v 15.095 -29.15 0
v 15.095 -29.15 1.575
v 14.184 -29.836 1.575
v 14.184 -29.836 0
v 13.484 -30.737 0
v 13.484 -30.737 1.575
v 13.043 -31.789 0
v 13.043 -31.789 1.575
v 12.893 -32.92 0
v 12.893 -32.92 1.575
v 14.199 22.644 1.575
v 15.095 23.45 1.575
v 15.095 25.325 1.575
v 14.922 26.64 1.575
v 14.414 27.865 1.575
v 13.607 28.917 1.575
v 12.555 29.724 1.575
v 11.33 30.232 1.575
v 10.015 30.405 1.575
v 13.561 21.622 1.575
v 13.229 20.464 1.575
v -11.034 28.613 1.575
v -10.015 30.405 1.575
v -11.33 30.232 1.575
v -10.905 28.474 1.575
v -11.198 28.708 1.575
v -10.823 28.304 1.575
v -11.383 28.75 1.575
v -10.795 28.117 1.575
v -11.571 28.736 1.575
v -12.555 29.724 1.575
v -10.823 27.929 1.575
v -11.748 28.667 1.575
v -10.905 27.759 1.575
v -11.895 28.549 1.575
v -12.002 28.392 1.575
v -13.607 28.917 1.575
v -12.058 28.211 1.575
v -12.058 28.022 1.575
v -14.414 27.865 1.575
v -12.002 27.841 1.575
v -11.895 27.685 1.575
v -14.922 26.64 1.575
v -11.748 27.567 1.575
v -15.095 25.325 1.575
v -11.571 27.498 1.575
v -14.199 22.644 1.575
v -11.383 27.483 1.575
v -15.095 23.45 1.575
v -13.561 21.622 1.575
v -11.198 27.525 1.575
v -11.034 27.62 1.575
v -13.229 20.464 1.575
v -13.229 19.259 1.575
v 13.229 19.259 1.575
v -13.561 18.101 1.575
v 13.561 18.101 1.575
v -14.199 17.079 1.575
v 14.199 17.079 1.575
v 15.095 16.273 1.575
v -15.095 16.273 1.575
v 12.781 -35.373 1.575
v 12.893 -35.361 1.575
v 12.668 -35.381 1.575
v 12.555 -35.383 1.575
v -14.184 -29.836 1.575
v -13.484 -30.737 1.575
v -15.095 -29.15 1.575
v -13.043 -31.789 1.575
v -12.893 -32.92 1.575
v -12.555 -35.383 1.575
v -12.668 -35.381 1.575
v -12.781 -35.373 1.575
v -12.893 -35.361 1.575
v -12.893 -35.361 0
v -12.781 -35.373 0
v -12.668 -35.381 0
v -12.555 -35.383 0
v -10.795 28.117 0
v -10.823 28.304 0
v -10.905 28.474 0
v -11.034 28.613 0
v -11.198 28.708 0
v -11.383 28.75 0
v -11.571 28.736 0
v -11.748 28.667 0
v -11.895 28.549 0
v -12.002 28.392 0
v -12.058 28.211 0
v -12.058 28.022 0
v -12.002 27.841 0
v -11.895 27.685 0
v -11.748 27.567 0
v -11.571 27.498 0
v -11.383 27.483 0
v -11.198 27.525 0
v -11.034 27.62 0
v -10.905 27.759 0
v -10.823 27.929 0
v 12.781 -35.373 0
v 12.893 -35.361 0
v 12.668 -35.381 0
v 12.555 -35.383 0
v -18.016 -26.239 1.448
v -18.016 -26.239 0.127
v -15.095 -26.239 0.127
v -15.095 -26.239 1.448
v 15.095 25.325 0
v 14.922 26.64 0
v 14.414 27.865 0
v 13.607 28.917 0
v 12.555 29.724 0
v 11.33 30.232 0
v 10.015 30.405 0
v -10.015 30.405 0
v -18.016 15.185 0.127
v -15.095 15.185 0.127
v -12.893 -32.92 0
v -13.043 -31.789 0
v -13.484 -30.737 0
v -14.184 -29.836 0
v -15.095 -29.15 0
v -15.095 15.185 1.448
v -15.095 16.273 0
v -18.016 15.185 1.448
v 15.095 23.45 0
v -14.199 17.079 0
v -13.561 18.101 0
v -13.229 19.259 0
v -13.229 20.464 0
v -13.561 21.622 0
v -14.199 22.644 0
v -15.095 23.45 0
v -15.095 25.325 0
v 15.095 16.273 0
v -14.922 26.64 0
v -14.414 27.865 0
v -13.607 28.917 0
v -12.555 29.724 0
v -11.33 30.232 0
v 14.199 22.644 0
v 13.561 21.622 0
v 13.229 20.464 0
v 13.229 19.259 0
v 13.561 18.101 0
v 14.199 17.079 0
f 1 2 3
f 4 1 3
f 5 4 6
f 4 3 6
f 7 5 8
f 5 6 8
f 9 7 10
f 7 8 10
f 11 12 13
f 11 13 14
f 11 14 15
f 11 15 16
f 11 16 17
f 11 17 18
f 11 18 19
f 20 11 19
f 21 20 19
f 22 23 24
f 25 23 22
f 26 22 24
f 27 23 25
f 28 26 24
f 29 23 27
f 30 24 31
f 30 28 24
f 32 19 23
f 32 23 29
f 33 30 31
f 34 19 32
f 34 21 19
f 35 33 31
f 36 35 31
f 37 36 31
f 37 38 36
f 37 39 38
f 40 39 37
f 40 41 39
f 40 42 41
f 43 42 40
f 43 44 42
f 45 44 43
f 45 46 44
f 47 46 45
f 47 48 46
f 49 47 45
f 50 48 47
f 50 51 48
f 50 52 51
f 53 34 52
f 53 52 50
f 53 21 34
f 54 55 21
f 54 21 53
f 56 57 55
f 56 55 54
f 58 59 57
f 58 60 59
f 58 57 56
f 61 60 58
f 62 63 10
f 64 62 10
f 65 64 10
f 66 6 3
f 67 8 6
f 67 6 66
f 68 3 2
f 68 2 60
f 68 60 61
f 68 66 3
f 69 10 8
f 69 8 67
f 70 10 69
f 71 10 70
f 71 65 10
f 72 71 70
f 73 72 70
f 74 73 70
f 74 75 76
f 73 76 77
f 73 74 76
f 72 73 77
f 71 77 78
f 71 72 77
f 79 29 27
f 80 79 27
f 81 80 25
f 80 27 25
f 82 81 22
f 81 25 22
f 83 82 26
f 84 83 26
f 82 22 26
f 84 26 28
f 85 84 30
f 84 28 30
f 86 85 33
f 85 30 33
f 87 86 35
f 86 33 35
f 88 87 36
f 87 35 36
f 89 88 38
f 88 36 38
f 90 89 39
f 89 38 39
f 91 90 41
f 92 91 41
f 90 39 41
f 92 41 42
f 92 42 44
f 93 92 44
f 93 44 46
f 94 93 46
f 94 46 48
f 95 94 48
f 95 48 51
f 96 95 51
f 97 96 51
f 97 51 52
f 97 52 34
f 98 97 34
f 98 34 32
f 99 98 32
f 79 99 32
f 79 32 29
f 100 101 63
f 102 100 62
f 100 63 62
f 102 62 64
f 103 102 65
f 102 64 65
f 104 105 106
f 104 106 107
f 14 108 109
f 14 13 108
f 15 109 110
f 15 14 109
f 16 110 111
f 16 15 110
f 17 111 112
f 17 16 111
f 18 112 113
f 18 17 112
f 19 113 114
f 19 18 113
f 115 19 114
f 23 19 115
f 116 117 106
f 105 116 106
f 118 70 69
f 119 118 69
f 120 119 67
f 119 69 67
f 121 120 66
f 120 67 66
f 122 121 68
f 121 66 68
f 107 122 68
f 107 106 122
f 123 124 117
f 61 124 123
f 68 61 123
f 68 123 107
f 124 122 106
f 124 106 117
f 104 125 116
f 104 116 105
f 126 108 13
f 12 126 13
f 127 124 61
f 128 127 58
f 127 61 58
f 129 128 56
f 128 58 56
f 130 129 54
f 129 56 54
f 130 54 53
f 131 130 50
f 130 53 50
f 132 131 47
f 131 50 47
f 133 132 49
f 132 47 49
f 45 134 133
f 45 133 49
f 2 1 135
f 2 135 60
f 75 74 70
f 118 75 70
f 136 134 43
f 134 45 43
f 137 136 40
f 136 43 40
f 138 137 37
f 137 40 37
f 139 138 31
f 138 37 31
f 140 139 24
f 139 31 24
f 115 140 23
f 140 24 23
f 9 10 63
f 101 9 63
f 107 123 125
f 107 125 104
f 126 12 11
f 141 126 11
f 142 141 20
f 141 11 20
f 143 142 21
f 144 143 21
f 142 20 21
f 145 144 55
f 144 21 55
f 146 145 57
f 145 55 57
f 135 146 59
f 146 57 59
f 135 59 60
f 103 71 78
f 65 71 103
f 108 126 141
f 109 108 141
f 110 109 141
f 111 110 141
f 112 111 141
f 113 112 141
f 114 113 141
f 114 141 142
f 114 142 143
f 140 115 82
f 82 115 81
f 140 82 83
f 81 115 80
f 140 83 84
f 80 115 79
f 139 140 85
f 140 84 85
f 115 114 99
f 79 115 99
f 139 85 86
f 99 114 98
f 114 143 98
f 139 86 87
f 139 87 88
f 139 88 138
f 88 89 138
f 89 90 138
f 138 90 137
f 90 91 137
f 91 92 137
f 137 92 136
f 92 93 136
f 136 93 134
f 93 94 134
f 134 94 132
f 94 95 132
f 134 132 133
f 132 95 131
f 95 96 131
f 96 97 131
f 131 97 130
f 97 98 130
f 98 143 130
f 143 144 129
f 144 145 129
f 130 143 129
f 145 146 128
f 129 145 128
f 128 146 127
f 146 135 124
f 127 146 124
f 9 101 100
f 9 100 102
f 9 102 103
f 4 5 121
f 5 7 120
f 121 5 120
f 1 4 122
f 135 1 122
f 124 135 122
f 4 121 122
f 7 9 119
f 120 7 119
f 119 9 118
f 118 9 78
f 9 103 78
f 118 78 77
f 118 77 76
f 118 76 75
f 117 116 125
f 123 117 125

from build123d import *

# Parameters (mm, degrees)
F0_W      = 30.19
F0_H      = 57
F1_DEPTH  = 1.5748
F2_W      = 30.19
F2_H      = 1.5748
F3_DEPTH  = 6.8834
F4_R      = 2.54
F5_R      = 4.32816
F6_DEPTH  = 1.5758
F7_W      = 30.19
F7_H      = 1.5748
F8_DEPTH  = 1.905
F9_R      = 5.08
F10_R     = 0.635
F11_DEPTH = 25.4
F12_W     = 41.4245947965
F12_H     = 1.3208
F13_DEPTH = 2.921


with BuildPart() as f1:
    # F0 (on Top) → F1 (new body)
    with BuildSketch(Plane.XY):
        Rectangle(F0_W, F0_H)
    extrude(amount=F1_DEPTH)

    # F2 (on face) → F3 (join)
    with BuildSketch(Plane.XZ.offset(28.5)):
        with Locations((0, 0.7874)):
            Rectangle(F2_W, F2_H)
    extrude(amount=F3_DEPTH)

    # F4
    f4_edges = [f1.edges().sort_by_distance(p)[0] for p in [
        (15.095, -35.3834, 0.7874),
        (-15.095, -35.3834, 0.7874),
    ]]
    fillet(f4_edges, radius=F4_R)

    # F5 (on face) → F6 (cut, through all)
    with BuildSketch(Plane.XY.offset(1.5748)):
        with Locations((-17.51457, 19.8616)):
            Circle(F5_R)
        with Locations((17.51457, 19.8616)):
            Circle(F5_R)
        with BuildLine():
            Line((-17.2212, -32.9196), (-12.89304, -32.9196))
            ThreePointArc((-12.89304, -32.9196), (-20.2816712861, -29.8591287139), (-17.2212, -37.24776))
            Line((-17.2212, -37.24776), (-17.2212, -32.9196))
        make_face()
        with BuildLine():
            Line((-12.89304, -37.24776), (-12.89304, -32.9196))
            ThreePointArc((-12.89304, -32.9196), (-14.1607287139, -35.9800712861), (-17.2212, -37.24776))
            Line((-17.2212, -37.24776), (-12.89304, -37.24776))
        make_face()
        with BuildLine():
            ThreePointArc((-17.2212, -37.24776), (-14.1607287139, -35.9800712861), (-12.89304, -32.9196))
            Line((-12.89304, -32.9196), (-17.2212, -32.9196))
            Line((-17.2212, -32.9196), (-17.2212, -37.24776))
        make_face()
        with BuildLine():
            ThreePointArc((17.2212, -37.24776), (20.2816712861, -35.9800712861), (21.54936, -32.9196))
            ThreePointArc((21.54936, -32.9196), (17.2212, -28.59144), (12.89304, -32.9196))
            Line((12.89304, -32.9196), (17.2212, -32.9196))
            Line((17.2212, -32.9196), (17.2212, -37.24776))
        make_face()
        with BuildLine():
            Line((17.2212, -32.9196), (12.89304, -32.9196))
            ThreePointArc((12.89304, -32.9196), (14.1607287139, -35.9800712861), (17.2212, -37.24776))
            Line((17.2212, -37.24776), (17.2212, -32.9196))
        make_face()
        with BuildLine():
            ThreePointArc((17.2212, -37.24776), (14.1607287139, -35.9800712861), (12.89304, -32.9196))
            Line((12.89304, -32.9196), (12.89304, -37.24776))
            Line((12.89304, -37.24776), (17.2212, -37.24776))
        make_face()
    extrude(amount=-F6_DEPTH, mode=Mode.SUBTRACT)

    # F7 (on face) → F8 (join)
    with BuildSketch(Plane(origin=(0, 28.5, 0), x_dir=(-1, 0, 0), z_dir=(0, 1, 0))):
        with Locations((0, 0.7874)):
            Rectangle(F7_W, F7_H)
    extrude(amount=F8_DEPTH)

    # F9
    f9_edges = [f1.edges().sort_by_distance(p)[0] for p in [
        (-15.095, 30.405, 0.7874),
        (15.095, 30.405, 0.7874),
    ]]
    fillet(f9_edges, radius=F9_R)

    # F10 (on face) → F11 (cut)
    with BuildSketch(Plane.XY.offset(1.5748)):
        with Locations((-11.43, 28.1166)):
            Circle(F10_R)
    extrude(amount=-F11_DEPTH, mode=Mode.SUBTRACT)

    # F12 (on face) → F13 (join)
    with BuildSketch(Plane(origin=(-15.095, 0, 0), x_dir=(0, -1, 0), z_dir=(-1, 0, 0))):
        with Locations((5.5271026017, 0.7874)):
            Rectangle(F12_W, F12_H)
    extrude(amount=F13_DEPTH)


solid = f1.part
